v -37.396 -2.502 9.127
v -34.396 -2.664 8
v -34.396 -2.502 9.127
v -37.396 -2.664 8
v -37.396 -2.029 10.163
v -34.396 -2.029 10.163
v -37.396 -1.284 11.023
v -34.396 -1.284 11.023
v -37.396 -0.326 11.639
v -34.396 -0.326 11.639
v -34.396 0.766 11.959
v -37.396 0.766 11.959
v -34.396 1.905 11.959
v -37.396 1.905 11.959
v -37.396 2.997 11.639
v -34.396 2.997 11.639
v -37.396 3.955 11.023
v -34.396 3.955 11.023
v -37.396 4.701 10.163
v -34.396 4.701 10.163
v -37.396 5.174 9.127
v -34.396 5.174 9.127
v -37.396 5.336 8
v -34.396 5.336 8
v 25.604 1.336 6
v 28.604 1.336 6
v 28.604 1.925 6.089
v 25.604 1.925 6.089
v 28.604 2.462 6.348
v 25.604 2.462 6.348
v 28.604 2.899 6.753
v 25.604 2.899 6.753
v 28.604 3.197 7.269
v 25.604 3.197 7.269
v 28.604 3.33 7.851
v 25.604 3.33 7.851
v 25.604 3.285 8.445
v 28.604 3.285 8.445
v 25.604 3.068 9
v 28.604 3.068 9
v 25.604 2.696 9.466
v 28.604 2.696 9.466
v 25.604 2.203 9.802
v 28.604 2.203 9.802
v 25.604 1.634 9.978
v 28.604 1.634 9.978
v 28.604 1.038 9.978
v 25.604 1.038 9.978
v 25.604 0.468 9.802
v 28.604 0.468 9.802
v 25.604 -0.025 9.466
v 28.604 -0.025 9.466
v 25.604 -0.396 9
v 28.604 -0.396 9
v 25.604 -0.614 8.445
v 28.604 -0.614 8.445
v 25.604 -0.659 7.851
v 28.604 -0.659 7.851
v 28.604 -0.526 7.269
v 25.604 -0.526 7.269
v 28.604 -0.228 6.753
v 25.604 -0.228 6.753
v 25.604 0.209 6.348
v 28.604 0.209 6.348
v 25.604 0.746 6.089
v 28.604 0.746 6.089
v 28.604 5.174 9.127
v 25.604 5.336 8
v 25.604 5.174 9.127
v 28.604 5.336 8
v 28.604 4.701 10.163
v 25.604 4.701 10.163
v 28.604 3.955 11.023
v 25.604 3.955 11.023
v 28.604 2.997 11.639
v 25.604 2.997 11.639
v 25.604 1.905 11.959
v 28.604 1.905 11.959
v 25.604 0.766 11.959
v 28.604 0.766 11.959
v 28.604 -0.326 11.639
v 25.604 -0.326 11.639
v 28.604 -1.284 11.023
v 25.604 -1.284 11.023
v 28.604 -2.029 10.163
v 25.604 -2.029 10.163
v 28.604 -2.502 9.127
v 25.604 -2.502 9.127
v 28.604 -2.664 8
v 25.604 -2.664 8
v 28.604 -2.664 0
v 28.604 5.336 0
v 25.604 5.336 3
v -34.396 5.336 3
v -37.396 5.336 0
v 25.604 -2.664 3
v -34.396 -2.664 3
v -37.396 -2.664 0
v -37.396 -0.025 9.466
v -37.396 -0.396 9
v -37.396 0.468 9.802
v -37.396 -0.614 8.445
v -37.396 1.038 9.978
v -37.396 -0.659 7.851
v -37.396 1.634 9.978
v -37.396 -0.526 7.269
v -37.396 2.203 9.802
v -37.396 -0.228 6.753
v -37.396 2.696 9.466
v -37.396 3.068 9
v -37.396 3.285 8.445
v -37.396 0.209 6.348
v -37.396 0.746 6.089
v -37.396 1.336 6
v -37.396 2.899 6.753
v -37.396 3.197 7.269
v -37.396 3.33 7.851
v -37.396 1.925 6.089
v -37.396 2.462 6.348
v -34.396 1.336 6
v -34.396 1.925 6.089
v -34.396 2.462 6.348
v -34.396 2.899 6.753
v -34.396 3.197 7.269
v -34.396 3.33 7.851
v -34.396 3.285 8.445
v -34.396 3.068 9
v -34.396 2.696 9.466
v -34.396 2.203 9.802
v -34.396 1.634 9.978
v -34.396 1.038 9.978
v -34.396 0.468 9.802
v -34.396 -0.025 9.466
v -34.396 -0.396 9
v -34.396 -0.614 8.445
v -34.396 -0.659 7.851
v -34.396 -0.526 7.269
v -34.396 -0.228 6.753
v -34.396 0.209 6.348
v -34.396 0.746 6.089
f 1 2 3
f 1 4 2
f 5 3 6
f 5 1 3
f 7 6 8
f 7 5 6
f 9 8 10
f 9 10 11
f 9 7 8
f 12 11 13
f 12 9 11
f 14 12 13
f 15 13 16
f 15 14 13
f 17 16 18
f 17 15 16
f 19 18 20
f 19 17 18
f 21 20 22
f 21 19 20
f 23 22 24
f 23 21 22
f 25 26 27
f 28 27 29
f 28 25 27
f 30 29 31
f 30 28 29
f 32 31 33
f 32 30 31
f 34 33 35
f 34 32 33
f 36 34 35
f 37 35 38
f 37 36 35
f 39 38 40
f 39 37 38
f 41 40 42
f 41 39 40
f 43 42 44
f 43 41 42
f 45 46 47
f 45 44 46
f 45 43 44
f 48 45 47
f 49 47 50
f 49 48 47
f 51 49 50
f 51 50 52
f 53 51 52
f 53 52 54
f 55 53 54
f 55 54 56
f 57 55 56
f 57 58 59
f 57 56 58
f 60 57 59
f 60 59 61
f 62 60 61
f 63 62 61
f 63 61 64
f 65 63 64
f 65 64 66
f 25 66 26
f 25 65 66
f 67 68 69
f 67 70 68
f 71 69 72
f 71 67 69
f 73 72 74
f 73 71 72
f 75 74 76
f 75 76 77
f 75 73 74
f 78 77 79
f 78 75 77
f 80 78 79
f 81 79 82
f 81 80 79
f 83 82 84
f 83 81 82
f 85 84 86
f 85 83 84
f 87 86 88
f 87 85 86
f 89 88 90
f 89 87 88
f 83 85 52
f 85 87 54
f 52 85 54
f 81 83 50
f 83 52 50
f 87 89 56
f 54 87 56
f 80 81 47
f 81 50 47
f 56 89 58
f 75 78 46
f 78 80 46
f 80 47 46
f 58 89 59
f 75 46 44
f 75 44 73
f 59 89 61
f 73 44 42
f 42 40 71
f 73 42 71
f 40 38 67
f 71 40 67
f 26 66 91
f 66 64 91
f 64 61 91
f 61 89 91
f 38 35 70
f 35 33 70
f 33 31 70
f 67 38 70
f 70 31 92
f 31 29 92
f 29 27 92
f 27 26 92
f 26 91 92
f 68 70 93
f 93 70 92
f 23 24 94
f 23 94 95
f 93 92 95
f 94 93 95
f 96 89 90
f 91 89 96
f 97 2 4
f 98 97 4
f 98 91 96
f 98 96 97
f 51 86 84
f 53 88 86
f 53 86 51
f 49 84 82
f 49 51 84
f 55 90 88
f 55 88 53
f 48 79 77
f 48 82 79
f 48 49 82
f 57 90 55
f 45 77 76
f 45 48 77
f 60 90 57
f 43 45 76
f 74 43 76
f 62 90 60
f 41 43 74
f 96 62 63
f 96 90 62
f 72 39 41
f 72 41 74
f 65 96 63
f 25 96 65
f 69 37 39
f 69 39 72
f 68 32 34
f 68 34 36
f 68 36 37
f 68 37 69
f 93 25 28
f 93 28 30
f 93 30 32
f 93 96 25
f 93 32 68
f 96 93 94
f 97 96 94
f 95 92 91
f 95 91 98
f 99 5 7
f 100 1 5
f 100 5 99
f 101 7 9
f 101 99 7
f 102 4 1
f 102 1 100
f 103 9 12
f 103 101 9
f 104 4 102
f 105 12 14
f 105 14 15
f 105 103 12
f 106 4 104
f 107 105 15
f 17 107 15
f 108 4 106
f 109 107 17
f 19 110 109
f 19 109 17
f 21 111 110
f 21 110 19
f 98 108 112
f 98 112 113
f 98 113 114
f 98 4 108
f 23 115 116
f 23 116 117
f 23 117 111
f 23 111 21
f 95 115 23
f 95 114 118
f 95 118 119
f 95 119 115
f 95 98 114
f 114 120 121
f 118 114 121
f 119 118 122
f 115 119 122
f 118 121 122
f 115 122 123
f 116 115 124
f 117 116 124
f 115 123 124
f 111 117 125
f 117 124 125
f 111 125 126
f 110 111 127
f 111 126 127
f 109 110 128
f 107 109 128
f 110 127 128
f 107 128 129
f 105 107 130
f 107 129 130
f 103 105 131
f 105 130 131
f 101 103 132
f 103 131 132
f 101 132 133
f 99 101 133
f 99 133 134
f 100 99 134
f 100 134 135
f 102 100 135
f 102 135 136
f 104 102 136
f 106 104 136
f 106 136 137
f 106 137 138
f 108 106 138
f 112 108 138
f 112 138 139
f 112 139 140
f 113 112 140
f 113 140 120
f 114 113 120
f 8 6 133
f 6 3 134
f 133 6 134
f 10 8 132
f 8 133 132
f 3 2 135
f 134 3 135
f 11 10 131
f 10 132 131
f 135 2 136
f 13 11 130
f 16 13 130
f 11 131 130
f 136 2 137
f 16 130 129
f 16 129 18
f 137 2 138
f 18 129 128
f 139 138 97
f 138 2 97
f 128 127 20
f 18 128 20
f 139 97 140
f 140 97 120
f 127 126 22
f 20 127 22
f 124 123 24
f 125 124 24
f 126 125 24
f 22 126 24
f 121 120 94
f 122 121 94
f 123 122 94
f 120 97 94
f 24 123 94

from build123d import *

# Parameters (mm, degrees)
SKETCH1_W                   = 3
SKETCH1_H                   = 8
SKETCH1_W_2                 = 30
BOSS_EXTRUDE3_DEPTH         = 3
SKETCH6_W                   = 3
SKETCH6_H                   = 8
BOSS_EXTRUDE5_DEPTH         = 9
FILLET3_RADIUS              = 4
FILLET3_LENGTH              = 3
SKETCH7_R                   = 2
CUT_EXTRUDE1_DEPTH          = 33.748571352
FILLET3_OF_MIRROR1_2_RADIUS = 4
FILLET3_OF_MIRROR1_2_LENGTH = 3


with BuildPart() as part:
    # Sketch1 → Boss-Extrude3 (new body)
    with BuildSketch(Plane.XY):
        with Locations((-35.895657312, 1.33562795)):
            Rectangle(SKETCH1_W, SKETCH1_H)
        with Locations((-19.395657312, 1.33562795)):
            Rectangle(SKETCH1_W_2, SKETCH1_H)
    boss_extrude3 = extrude(amount=BOSS_EXTRUDE3_DEPTH)

    # Sketch6 → Boss-Extrude5 (add)
    with BuildSketch(Plane.XY.offset(3)):
        with Locations((-35.895657312, 1.33562795)):
            Rectangle(SKETCH6_W, SKETCH6_H)
    boss_extrude5 = extrude(amount=BOSS_EXTRUDE5_DEPTH)

    # Fillet3: full round fillet: the end face becomes a half cylinder, R = half its width
    fillet3_face = Plane((-35.895657312, 1.33562795, 12), x_dir=(-1, 0, 0), z_dir=(0, 0, 1))  # on the end face: x along it, z out of the body
    fillet3_slab = fillet3_face.offset(-FILLET3_RADIUS / 2) * Box(FILLET3_LENGTH, 2 * FILLET3_RADIUS, FILLET3_RADIUS, mode=Mode.PRIVATE)  # the body's end, R deep
    fillet3_round = Plane((-35.895657312, 1.33562795, 8), x_dir=(0, 0, 1), z_dir=(-1, 0, 0)) * Cylinder(FILLET3_RADIUS, FILLET3_LENGTH, mode=Mode.PRIVATE)  # its axis R under the face
    add(fillet3_slab - fillet3_round, mode=Mode.SUBTRACT)

    # Sketch7 → Cut-Extrude1 (cut, through all)
    with BuildSketch(Plane(origin=(-34.395657312, 0, 0), x_dir=(0, 0, -1), z_dir=(1, 0, 0))):
        with Locations((-8, 1.33562795)):
            Circle(SKETCH7_R)
    cut_extrude1 = extrude(amount=-CUT_EXTRUDE1_DEPTH, mode=Mode.SUBTRACT)

    # Mirror1: Boss-Extrude3, Boss-Extrude5, Cut-Extrude1 across plane
    add(boss_extrude3.mirror(Plane(origin=(-4.395657312, 0, 0), x_dir=(0, 0, 1), z_dir=(1, 0, 0))))
    add(boss_extrude5.mirror(Plane(origin=(-4.395657312, 0, 0), x_dir=(0, 0, 1), z_dir=(1, 0, 0))))
    add(cut_extrude1.mirror(Plane(origin=(-4.395657312, 0, 0), x_dir=(0, 0, 1), z_dir=(1, 0, 0))), mode=Mode.SUBTRACT)

    # Fillet3 of Mirror1 2: full round fillet: the end face becomes a half cylinder, R = half its width
    fillet3_of_mirror1_2_face = Plane((27.104342688, 1.33562795, 12), x_dir=(1, 0, 0), z_dir=(0, 0, 1))  # on the end face: x along it, z out of the body
    fillet3_of_mirror1_2_slab = fillet3_of_mirror1_2_face.offset(-FILLET3_OF_MIRROR1_2_RADIUS / 2) * Box(FILLET3_OF_MIRROR1_2_LENGTH, 2 * FILLET3_OF_MIRROR1_2_RADIUS, FILLET3_OF_MIRROR1_2_RADIUS, mode=Mode.PRIVATE)  # the body's end, R deep
    fillet3_of_mirror1_2_round = Plane((27.104342688, 1.33562795, 8), x_dir=(0, 0, 1), z_dir=(1, 0, 0)) * Cylinder(FILLET3_OF_MIRROR1_2_RADIUS, FILLET3_OF_MIRROR1_2_LENGTH, mode=Mode.PRIVATE)  # its axis R under the face
    add(fillet3_of_mirror1_2_slab - fillet3_of_mirror1_2_round, mode=Mode.SUBTRACT)


solid = part.part
